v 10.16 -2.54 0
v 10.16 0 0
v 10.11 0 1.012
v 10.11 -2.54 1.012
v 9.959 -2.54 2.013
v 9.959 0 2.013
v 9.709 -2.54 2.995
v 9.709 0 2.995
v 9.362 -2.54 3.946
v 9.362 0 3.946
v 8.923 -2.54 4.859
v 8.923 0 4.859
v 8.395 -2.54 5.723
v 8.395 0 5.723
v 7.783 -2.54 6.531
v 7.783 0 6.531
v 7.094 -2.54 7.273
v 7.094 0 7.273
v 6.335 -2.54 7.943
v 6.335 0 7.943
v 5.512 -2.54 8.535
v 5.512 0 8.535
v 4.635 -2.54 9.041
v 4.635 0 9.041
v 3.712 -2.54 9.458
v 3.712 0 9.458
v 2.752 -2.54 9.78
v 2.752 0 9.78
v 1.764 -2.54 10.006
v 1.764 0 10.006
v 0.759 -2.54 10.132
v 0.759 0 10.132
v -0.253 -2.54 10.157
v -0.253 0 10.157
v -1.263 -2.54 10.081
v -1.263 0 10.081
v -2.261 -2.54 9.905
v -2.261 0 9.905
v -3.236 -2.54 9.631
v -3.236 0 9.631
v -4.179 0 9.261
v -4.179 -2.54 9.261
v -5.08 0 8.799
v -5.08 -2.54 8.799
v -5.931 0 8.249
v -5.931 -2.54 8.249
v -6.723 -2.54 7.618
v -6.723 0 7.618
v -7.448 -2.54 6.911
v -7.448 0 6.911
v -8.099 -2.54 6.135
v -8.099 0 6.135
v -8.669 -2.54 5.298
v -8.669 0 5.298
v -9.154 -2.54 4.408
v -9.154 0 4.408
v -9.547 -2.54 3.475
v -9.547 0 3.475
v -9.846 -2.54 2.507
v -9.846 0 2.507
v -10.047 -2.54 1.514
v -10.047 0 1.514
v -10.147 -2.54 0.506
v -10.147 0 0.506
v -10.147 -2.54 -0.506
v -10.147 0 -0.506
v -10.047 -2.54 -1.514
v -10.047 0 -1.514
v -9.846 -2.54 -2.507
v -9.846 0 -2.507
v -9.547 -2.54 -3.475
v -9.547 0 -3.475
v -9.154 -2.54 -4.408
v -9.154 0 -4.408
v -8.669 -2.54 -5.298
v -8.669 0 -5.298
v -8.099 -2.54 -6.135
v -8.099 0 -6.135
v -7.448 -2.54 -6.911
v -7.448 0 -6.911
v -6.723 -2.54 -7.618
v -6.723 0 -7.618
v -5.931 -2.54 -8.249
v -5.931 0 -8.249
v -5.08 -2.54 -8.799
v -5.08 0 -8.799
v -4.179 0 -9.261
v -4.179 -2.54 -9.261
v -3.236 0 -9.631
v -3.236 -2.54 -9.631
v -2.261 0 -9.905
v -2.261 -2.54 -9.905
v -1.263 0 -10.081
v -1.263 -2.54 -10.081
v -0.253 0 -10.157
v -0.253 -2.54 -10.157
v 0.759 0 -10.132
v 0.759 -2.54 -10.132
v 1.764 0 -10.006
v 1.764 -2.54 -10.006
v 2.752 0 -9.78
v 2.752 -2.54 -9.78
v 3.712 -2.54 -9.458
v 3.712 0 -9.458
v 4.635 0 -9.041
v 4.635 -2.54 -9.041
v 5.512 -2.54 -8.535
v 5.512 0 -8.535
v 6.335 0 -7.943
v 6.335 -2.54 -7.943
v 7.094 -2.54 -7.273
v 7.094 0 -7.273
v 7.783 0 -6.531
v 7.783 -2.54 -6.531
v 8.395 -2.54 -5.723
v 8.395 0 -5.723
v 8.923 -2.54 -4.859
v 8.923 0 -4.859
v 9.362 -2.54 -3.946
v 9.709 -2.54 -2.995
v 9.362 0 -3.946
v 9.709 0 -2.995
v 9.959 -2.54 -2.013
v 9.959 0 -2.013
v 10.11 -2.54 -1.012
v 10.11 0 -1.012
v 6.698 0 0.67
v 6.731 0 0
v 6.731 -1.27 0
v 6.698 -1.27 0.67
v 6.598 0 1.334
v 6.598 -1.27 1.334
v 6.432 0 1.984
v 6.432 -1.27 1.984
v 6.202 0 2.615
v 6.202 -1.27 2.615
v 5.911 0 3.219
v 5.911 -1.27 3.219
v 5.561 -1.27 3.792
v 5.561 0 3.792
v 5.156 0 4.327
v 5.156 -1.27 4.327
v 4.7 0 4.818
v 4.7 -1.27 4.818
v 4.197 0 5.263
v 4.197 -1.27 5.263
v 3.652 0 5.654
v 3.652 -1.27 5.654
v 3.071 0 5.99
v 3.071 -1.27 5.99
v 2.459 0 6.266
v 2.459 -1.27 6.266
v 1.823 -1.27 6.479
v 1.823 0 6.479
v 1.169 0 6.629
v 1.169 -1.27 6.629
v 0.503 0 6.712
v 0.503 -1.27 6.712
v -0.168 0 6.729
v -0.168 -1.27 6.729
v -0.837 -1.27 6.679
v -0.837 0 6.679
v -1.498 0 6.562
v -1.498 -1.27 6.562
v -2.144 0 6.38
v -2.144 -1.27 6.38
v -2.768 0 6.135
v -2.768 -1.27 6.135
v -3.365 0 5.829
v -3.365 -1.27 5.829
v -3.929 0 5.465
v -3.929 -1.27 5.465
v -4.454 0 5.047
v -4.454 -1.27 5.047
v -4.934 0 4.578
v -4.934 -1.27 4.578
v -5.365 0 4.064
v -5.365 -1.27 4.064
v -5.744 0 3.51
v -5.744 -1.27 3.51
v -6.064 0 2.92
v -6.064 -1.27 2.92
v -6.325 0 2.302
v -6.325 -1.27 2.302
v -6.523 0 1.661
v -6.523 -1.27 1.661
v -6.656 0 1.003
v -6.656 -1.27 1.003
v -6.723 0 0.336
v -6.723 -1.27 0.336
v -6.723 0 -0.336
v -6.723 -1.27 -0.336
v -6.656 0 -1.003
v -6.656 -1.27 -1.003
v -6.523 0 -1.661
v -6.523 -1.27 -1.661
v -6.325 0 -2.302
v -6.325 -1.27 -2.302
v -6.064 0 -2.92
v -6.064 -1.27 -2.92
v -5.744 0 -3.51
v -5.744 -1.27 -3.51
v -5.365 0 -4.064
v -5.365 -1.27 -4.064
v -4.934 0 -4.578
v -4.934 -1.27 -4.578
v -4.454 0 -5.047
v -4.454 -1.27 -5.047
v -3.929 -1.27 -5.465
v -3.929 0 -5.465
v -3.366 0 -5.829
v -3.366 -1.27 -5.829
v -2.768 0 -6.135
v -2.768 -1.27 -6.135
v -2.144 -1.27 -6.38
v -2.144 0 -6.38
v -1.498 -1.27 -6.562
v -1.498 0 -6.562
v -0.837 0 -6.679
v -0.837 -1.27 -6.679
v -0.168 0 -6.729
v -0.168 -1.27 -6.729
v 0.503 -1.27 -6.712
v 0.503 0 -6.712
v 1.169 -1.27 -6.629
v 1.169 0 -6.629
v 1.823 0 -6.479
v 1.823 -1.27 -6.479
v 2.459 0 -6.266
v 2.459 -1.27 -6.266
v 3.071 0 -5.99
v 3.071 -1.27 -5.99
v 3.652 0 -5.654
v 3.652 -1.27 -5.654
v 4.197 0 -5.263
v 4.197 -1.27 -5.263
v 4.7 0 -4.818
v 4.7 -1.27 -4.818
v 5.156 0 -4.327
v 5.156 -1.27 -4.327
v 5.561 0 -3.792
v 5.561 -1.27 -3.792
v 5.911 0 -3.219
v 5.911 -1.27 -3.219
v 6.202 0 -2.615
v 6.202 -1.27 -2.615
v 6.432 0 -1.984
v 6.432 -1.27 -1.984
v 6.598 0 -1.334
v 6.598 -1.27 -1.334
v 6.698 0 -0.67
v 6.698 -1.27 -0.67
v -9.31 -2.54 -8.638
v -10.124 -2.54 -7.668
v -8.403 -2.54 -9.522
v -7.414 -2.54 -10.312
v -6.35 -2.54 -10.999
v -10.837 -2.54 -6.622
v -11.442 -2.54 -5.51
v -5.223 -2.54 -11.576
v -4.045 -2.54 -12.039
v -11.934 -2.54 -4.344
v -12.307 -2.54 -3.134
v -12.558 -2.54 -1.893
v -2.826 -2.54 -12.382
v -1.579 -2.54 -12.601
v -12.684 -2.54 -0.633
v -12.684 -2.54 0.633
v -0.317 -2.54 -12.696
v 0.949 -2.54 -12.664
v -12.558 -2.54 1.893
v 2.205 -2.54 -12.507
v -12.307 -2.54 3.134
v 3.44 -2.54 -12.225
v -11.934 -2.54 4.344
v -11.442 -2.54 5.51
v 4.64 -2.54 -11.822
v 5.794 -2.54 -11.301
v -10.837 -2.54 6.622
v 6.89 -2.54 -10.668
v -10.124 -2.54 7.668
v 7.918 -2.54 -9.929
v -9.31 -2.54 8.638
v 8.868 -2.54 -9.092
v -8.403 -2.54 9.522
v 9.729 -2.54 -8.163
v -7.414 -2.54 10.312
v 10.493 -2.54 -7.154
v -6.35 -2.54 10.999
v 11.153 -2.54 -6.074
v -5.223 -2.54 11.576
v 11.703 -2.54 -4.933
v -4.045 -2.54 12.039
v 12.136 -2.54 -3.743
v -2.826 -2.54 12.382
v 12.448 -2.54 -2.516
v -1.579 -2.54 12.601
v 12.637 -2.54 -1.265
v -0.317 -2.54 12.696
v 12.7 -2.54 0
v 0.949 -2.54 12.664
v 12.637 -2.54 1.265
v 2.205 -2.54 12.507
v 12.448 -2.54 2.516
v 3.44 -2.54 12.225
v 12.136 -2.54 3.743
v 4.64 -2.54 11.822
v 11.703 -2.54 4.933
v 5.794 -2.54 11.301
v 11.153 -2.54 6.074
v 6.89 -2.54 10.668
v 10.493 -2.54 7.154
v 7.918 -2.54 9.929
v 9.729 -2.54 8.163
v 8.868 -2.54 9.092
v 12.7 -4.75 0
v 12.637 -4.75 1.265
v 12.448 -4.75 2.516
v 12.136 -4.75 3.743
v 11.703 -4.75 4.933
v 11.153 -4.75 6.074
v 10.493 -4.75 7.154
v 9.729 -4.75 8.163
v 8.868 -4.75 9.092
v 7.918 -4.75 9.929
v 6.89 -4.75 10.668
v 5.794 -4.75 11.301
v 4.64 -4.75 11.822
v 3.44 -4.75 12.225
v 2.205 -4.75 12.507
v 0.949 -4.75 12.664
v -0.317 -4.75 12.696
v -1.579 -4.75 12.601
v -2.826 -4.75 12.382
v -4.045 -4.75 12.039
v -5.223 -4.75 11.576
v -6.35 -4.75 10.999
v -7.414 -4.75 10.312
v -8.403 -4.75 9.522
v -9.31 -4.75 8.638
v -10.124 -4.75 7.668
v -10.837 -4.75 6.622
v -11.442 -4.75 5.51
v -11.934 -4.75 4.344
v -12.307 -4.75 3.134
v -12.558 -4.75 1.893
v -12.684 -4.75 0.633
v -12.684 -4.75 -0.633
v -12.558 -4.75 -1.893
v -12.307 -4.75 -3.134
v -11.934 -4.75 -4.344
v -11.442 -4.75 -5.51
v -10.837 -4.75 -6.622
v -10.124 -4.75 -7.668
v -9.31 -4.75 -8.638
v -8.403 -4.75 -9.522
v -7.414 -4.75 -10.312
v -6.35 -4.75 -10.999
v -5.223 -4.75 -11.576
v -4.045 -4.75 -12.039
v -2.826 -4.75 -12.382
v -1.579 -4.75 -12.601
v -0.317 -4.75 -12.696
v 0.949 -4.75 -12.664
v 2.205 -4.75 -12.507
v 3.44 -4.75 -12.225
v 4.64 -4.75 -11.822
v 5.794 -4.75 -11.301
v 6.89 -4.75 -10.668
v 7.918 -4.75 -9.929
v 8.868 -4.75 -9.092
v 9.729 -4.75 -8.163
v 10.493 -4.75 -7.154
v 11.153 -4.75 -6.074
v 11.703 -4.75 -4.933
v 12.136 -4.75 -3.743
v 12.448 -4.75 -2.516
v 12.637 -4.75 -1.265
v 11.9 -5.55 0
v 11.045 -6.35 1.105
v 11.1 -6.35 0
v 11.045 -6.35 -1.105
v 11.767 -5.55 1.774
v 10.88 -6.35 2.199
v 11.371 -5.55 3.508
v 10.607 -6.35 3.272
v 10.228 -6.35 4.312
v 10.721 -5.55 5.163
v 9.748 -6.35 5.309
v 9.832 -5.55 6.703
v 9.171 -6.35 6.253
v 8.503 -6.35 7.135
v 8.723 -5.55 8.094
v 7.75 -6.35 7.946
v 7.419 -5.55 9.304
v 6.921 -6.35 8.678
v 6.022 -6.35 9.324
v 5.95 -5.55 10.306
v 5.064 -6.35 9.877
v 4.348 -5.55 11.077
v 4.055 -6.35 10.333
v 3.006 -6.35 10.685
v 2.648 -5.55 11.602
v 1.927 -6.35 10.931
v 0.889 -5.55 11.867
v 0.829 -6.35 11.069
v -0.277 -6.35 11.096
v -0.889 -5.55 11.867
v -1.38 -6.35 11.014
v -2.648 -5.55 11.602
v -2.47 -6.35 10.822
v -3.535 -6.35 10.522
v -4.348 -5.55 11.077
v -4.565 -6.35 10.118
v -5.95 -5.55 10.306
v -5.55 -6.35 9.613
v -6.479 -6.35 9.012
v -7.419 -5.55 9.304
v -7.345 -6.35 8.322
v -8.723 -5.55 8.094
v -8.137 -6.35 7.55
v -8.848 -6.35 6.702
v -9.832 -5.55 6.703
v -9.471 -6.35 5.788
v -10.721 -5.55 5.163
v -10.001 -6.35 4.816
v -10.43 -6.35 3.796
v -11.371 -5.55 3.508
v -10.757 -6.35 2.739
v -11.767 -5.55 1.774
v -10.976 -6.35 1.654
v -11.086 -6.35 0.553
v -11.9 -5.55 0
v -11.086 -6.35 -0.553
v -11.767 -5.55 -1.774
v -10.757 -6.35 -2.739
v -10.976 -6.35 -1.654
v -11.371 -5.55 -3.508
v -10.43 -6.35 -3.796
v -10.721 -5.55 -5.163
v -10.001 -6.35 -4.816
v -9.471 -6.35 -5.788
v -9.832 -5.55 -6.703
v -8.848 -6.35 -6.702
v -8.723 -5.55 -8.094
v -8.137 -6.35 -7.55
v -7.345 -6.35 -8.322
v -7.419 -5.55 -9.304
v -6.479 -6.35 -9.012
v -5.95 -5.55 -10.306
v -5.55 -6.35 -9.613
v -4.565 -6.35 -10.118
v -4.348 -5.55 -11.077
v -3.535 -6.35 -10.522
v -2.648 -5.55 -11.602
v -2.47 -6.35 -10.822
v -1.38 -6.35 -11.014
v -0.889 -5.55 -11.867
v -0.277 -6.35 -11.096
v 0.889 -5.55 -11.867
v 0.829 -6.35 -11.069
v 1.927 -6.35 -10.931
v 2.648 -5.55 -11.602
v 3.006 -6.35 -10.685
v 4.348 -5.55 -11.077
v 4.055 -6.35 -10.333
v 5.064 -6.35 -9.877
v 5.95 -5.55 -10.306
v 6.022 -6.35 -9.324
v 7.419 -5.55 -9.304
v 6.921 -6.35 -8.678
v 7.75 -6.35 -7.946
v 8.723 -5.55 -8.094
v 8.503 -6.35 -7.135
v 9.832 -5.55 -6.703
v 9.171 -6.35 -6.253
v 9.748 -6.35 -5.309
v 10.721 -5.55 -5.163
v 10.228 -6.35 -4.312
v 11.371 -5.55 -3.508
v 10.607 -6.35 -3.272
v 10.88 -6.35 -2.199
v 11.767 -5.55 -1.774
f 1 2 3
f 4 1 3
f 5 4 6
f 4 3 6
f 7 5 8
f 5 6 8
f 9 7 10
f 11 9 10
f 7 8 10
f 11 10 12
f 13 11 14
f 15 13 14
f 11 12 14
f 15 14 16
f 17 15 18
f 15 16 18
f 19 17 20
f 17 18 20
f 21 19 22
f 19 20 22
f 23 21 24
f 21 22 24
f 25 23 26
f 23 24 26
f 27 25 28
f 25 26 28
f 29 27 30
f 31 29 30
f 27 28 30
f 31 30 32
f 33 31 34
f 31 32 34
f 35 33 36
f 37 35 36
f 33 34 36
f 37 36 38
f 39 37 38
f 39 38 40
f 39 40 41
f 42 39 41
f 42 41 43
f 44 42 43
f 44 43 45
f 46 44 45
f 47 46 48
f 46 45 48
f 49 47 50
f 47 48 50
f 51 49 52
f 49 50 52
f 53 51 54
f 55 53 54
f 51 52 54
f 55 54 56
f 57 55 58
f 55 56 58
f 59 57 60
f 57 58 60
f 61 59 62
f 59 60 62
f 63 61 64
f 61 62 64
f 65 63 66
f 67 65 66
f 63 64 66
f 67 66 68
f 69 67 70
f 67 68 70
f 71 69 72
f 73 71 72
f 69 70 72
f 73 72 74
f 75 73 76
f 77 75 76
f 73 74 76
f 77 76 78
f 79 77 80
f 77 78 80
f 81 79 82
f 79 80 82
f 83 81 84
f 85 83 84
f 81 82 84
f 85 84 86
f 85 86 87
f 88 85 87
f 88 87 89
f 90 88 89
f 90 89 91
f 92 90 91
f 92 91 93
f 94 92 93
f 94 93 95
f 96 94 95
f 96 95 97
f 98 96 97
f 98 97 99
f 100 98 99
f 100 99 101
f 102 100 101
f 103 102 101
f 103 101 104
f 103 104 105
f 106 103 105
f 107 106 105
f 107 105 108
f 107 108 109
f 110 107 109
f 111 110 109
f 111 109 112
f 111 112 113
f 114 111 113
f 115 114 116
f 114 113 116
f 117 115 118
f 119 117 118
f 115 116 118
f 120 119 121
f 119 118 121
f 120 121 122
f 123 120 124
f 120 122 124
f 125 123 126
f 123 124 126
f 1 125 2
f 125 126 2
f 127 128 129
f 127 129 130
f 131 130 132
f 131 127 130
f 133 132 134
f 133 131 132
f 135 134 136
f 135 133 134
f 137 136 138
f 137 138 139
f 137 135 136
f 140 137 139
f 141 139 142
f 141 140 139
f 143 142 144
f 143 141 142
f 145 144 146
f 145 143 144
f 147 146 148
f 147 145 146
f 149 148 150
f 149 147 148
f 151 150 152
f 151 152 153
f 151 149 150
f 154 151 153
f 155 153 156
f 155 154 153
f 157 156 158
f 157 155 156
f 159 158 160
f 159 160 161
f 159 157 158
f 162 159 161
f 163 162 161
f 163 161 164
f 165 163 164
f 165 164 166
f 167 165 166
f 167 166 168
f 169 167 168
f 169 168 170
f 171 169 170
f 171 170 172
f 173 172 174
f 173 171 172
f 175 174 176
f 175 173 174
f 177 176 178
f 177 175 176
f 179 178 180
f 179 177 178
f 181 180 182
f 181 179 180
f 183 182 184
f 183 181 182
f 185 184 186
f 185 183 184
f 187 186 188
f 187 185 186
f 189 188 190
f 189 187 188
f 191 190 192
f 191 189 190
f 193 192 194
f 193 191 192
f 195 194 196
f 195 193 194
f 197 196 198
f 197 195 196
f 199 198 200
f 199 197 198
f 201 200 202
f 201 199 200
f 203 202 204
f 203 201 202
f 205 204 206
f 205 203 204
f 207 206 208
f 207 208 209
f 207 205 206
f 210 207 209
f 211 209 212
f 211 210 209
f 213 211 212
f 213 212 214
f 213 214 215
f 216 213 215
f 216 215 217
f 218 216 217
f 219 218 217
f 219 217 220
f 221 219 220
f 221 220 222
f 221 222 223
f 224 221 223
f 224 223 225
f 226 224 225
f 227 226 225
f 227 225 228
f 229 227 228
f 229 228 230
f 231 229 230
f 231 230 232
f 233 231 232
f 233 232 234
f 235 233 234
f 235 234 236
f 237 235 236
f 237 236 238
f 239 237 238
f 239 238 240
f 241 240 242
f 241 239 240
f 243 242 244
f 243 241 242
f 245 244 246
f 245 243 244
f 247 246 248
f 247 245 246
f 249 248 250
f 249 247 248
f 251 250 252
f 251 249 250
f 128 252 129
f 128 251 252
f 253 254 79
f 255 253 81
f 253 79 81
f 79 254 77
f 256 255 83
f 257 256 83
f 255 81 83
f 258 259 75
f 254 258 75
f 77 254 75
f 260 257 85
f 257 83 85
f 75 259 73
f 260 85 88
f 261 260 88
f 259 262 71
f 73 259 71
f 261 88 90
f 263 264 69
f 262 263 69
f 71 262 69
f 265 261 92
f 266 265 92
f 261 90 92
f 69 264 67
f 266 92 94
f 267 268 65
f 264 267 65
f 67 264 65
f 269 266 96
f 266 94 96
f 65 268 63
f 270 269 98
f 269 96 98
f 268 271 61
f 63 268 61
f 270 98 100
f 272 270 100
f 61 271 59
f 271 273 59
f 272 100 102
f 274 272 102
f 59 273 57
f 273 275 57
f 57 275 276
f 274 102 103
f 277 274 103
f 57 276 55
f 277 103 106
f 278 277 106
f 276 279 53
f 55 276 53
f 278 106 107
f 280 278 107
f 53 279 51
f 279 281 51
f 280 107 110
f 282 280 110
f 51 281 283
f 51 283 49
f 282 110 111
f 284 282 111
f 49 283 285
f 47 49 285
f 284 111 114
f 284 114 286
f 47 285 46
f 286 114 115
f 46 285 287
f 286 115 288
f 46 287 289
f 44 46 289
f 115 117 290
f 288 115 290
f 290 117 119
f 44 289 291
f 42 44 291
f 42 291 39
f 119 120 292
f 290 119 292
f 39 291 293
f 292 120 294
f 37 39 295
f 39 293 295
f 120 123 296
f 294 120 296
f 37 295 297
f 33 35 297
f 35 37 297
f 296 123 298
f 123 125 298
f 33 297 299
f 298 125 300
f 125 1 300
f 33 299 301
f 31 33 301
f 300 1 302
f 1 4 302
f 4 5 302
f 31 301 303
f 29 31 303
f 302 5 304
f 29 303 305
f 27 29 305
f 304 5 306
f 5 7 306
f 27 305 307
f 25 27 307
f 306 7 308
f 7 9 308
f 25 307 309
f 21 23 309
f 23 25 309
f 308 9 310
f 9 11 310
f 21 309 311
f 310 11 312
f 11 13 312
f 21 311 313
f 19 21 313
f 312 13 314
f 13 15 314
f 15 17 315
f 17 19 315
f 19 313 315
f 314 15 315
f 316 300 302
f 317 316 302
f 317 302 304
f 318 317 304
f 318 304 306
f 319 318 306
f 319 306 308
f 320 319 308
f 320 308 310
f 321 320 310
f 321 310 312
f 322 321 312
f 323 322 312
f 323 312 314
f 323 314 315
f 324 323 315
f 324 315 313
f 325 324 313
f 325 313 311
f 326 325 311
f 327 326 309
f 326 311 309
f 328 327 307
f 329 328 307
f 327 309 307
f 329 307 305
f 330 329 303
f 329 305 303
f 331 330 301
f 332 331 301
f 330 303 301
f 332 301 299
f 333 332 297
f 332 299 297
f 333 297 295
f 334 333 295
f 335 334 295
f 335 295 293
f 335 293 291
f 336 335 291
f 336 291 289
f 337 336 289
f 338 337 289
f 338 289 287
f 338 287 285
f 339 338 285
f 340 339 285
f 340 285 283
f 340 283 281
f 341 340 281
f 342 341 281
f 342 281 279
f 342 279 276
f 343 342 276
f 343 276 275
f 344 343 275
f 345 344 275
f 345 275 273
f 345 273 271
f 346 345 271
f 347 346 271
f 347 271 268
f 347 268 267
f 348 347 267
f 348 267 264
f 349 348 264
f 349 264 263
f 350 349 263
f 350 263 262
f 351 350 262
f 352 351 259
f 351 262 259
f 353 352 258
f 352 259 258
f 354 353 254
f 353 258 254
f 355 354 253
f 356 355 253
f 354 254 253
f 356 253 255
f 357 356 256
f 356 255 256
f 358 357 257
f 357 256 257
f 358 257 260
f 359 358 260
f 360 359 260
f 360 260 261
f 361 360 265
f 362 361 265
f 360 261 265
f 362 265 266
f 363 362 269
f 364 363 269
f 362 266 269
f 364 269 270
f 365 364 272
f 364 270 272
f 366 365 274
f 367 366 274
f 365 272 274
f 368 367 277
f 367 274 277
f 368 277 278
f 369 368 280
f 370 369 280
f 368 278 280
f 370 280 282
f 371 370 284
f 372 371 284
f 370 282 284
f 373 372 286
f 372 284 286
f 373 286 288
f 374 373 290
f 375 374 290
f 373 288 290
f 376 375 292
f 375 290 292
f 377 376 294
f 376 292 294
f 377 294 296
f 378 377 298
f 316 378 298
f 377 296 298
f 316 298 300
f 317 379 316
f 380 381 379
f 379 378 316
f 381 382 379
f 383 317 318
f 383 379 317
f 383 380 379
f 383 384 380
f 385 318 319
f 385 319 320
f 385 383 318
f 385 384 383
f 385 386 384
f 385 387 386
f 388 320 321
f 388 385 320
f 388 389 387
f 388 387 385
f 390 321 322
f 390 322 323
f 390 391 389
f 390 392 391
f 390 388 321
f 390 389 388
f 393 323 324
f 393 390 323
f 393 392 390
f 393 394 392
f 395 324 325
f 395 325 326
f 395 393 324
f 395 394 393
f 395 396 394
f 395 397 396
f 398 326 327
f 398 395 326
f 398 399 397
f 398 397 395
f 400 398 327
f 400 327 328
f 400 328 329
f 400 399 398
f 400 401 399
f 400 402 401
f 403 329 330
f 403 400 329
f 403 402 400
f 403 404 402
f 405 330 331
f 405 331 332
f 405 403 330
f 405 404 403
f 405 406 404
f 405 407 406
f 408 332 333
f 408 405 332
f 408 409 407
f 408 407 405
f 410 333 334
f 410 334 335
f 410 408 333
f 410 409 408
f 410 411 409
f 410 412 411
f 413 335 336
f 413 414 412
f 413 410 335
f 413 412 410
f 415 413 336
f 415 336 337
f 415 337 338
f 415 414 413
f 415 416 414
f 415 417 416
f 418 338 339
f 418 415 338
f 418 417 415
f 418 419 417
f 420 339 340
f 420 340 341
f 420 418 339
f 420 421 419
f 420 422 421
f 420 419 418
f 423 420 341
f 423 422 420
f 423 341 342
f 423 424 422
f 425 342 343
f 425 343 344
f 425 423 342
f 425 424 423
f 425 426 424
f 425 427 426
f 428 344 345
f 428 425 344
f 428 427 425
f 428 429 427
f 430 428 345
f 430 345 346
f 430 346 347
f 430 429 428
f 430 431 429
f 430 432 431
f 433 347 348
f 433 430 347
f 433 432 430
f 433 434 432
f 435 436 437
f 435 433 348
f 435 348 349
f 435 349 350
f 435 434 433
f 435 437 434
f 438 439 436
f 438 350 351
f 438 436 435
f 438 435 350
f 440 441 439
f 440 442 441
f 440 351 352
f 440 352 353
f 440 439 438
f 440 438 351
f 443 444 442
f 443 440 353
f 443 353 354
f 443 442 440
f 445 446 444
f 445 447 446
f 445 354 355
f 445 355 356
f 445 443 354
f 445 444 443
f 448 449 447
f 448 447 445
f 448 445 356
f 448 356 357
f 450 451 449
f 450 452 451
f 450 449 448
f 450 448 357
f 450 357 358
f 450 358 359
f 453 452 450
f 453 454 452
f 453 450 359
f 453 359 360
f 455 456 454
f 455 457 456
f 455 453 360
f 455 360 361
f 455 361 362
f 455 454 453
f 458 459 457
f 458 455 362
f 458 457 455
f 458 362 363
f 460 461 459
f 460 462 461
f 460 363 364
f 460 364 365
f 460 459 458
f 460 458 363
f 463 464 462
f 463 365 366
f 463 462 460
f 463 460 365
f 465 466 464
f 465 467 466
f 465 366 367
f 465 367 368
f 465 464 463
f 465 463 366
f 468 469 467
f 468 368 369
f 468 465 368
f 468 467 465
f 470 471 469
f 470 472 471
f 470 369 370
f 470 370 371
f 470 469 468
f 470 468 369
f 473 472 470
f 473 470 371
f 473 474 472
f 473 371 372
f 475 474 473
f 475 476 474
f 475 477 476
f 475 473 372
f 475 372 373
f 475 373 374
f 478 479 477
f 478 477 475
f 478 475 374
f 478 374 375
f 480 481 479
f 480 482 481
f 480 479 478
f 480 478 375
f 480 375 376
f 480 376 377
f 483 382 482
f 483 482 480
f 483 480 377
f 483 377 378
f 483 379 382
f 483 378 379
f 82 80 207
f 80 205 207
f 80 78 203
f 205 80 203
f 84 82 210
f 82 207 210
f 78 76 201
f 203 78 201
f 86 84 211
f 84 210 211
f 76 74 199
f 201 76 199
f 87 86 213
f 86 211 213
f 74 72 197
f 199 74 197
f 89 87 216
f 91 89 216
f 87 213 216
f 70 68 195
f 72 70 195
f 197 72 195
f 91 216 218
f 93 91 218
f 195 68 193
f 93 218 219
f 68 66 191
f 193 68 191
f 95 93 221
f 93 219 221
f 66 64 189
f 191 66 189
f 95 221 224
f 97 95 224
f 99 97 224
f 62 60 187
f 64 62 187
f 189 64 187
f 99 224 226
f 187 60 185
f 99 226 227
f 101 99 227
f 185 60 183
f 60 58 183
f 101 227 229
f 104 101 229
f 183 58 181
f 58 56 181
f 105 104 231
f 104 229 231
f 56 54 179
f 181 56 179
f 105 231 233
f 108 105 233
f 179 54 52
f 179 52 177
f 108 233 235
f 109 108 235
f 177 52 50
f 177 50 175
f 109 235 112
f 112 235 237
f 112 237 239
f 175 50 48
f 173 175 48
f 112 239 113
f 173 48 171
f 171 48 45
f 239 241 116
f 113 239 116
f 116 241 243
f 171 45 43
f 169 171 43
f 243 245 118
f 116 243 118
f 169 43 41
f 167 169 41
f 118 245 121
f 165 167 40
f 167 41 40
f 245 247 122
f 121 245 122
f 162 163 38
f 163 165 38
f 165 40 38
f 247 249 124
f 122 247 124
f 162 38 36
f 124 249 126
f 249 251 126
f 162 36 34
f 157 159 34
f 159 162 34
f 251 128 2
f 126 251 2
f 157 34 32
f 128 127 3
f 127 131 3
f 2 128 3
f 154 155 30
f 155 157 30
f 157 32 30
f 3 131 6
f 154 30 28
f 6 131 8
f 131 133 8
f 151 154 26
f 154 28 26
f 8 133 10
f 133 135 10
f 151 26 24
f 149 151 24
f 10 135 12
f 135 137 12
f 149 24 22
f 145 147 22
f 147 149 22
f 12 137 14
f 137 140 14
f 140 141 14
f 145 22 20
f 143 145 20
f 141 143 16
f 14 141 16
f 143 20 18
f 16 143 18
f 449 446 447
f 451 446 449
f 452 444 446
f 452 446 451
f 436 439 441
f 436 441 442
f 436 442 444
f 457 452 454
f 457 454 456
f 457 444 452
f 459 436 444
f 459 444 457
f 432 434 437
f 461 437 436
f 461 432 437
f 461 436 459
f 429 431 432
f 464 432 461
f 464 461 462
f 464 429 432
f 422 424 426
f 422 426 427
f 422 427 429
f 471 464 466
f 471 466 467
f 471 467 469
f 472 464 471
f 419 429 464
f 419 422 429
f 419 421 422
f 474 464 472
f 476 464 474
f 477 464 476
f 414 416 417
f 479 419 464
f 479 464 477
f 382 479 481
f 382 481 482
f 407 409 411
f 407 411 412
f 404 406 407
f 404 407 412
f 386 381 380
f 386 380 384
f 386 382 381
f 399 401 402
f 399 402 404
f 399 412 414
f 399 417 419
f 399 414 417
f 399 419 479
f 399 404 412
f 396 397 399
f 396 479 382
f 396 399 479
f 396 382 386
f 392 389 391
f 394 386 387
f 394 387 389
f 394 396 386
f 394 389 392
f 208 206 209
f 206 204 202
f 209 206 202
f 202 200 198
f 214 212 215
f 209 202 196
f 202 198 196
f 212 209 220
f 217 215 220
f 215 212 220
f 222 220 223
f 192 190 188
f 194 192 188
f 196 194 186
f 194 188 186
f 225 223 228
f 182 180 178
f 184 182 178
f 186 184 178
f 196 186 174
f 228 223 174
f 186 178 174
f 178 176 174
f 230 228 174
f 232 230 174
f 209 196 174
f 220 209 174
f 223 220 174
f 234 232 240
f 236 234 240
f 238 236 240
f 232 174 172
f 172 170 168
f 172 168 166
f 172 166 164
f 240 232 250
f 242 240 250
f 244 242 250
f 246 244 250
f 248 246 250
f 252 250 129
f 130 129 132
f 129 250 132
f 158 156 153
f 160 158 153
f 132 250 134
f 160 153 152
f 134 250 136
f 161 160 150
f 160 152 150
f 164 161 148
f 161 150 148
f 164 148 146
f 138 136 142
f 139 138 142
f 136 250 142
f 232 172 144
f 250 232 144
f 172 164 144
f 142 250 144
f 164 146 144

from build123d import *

# Parameters (mm, degrees)
F0_R     = 12.7
F0_R_2   = 10.16
F0_R_3   = 6.731
F1_DEPTH = 6.35
F2_DEPTH = 2.54
F3_DEPTH = 1.27
F4_SIZE  = 1.6002


with BuildPart() as f1:
    # F0 (on Front) → F1 (new body)
    with BuildSketch(Plane.XZ):
        Circle(F0_R)
        Circle(F0_R_2, mode=Mode.SUBTRACT)
        Circle(F0_R_2)
        Circle(F0_R_3, mode=Mode.SUBTRACT)
        Circle(F0_R_3)
    extrude(amount=F1_DEPTH)

    # F0 (on Front) → F2 (cut)
    with BuildSketch(Plane.XZ):
        Circle(F0_R)
        Circle(F0_R_2, mode=Mode.SUBTRACT)
    extrude(amount=F2_DEPTH, mode=Mode.SUBTRACT)

    # F0 (on Front) → F3 (cut)
    with BuildSketch(Plane.XZ):
        Circle(F0_R_3)
    extrude(amount=F3_DEPTH, mode=Mode.SUBTRACT)

    # F4
    f4_edges = [f1.edges().sort_by_distance(p)[0] for p in [
        (-12.7, -6.35, 0),
    ]]
    chamfer(f4_edges, length=F4_SIZE)


solid = f1.part
